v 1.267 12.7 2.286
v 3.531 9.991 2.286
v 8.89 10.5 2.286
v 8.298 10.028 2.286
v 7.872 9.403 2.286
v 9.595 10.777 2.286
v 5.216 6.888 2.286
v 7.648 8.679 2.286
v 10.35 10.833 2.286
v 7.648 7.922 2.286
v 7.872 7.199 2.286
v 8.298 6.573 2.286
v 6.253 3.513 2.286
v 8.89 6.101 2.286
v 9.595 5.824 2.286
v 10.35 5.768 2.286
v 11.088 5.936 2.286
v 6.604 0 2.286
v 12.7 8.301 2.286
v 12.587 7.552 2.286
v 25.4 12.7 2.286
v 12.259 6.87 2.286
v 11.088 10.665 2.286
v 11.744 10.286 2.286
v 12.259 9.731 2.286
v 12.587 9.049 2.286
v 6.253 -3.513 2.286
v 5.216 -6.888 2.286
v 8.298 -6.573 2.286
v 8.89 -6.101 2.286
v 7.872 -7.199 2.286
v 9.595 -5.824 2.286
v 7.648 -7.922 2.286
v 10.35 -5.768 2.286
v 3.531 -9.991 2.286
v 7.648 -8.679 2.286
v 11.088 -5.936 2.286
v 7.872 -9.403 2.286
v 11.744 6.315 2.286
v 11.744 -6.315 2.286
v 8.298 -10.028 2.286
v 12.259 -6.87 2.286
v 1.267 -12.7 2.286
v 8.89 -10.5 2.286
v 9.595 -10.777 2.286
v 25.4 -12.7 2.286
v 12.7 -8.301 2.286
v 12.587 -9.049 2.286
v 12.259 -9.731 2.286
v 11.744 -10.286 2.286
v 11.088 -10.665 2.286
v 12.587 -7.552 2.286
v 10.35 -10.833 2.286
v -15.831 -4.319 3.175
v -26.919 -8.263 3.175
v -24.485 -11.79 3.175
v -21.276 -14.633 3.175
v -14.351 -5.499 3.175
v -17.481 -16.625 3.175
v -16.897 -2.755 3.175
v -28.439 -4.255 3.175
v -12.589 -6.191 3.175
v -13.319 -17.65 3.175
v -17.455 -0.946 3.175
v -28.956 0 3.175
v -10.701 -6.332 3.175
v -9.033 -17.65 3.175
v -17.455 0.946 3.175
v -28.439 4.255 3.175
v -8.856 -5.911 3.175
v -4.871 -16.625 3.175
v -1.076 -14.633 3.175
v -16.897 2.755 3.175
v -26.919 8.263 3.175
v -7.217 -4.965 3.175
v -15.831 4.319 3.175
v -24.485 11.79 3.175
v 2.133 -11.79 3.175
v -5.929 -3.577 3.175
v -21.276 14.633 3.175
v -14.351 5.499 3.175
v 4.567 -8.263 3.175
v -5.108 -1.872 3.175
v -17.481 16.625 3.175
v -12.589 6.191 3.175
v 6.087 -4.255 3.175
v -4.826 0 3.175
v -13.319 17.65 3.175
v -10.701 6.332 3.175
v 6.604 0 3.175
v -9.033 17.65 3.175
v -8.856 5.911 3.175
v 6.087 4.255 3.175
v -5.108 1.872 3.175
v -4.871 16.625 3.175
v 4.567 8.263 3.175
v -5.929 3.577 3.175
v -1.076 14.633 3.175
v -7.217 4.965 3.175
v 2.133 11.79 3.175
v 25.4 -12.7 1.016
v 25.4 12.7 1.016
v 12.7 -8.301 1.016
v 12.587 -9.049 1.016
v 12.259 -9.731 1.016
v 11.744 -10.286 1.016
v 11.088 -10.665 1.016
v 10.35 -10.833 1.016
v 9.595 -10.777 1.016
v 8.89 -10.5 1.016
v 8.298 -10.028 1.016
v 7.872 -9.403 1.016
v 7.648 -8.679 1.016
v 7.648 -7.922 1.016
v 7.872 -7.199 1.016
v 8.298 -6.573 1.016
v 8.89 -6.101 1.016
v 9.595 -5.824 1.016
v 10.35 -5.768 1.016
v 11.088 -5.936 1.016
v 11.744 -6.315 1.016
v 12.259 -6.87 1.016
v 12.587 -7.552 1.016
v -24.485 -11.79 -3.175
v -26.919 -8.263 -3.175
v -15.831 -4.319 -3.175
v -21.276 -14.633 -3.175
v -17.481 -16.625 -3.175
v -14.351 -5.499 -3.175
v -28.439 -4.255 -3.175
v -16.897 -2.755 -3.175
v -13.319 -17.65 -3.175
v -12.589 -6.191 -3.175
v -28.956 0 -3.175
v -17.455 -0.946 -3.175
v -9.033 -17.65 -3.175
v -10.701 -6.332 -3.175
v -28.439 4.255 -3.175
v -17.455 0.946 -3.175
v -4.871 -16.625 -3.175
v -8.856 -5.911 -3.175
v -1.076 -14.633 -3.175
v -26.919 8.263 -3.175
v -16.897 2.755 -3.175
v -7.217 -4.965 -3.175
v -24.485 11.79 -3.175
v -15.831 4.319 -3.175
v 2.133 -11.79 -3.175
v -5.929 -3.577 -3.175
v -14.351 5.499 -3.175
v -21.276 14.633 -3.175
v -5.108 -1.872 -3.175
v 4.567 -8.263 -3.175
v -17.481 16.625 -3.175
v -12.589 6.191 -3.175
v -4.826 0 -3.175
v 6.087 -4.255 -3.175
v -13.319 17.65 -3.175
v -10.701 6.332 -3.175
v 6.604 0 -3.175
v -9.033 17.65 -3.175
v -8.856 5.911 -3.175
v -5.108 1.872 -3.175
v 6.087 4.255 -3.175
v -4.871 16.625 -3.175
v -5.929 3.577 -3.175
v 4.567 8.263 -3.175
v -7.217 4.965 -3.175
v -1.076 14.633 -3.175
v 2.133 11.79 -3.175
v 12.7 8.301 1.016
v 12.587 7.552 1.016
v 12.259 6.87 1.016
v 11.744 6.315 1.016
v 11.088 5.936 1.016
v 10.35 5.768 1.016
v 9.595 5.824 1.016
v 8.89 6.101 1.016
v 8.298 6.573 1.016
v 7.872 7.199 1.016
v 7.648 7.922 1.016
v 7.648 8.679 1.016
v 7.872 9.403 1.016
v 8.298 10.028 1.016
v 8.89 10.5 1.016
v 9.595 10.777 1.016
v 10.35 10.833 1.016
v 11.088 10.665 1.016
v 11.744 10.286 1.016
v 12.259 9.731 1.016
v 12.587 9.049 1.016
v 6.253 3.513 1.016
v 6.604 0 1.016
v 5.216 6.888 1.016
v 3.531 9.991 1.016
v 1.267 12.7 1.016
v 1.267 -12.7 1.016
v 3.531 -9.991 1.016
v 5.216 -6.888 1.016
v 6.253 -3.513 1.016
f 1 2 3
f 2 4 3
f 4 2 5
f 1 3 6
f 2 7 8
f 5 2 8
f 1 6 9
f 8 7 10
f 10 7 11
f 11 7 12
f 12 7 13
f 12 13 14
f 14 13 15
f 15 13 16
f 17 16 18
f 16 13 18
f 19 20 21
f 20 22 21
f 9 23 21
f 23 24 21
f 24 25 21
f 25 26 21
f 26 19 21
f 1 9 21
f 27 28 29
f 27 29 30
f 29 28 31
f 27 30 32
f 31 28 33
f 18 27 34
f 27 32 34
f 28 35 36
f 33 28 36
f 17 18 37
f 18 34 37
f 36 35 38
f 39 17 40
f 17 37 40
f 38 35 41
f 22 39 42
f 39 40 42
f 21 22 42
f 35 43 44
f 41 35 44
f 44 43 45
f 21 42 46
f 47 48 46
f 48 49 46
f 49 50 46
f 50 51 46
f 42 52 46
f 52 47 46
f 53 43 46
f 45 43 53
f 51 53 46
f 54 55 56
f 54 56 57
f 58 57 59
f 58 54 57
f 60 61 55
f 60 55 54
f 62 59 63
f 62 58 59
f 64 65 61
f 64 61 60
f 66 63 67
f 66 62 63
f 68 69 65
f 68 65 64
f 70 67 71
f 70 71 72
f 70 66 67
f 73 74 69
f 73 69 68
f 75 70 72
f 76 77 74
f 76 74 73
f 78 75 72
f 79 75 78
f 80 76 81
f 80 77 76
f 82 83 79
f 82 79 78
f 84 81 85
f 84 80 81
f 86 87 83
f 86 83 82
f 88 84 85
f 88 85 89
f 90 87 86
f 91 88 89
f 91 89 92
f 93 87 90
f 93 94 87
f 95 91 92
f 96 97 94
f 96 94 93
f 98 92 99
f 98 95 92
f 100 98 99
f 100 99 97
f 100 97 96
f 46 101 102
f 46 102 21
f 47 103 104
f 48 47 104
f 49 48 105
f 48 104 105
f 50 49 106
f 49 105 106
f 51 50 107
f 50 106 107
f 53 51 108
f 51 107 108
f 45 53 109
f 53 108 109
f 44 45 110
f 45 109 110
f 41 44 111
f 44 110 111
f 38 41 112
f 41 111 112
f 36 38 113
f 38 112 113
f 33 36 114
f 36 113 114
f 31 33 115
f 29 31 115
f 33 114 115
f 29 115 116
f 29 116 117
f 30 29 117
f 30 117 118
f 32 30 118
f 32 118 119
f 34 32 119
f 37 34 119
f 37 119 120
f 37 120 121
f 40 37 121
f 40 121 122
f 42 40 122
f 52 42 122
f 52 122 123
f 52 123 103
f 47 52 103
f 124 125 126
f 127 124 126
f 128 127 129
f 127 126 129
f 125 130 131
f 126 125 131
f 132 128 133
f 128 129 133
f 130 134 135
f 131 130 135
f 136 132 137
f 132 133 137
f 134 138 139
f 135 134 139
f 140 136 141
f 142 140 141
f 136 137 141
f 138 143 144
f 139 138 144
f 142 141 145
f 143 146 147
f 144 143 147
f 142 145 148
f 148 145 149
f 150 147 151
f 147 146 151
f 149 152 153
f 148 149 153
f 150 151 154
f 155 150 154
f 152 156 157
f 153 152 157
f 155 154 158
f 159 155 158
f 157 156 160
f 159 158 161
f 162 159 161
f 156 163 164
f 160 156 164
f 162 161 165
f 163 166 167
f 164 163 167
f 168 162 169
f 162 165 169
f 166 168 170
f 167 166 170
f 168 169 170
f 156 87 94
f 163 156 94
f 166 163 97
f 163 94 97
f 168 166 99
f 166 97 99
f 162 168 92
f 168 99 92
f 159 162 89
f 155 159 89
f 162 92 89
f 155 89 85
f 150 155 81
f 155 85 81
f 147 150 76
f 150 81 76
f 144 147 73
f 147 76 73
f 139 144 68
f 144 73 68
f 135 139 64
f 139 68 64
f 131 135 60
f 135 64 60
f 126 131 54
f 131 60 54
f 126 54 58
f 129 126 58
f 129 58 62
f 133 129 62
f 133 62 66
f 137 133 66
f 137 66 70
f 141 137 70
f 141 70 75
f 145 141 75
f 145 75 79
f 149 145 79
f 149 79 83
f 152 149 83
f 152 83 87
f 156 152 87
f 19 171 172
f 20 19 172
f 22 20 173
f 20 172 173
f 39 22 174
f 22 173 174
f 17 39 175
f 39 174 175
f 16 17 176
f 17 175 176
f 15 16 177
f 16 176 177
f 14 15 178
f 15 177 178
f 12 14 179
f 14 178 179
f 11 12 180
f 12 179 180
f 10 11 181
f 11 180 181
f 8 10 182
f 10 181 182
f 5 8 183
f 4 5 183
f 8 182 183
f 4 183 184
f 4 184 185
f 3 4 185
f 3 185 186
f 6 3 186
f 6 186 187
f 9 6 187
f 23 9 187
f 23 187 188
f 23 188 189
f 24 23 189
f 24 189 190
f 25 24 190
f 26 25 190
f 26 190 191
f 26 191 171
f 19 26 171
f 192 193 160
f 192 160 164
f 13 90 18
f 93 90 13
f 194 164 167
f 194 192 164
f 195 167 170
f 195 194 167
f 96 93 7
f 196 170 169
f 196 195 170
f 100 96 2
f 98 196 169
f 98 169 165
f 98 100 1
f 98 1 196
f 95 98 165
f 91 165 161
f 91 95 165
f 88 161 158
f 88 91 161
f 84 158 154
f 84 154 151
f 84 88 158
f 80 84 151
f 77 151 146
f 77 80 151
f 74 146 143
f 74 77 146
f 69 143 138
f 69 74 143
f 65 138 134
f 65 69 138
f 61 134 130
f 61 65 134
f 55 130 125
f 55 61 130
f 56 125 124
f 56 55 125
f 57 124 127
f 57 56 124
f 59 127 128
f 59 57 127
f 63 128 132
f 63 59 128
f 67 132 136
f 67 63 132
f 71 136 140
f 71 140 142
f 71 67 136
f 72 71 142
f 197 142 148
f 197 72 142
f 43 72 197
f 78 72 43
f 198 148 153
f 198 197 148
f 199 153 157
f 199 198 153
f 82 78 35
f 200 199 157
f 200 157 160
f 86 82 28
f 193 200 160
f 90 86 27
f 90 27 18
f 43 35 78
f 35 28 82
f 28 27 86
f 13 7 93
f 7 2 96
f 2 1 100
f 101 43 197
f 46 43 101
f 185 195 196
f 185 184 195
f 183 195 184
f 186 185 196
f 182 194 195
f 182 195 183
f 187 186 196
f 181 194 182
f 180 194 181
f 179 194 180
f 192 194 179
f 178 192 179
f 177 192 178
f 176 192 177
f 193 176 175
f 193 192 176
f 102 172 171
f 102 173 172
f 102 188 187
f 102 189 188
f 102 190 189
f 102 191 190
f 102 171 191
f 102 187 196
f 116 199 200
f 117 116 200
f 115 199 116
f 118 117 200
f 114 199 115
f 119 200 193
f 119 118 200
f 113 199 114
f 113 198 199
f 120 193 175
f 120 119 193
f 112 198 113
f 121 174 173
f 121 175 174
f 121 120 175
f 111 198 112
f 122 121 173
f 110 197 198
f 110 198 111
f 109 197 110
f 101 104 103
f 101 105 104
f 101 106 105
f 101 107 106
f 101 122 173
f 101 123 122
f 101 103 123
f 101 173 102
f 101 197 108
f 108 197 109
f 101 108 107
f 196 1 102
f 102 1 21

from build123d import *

# Parameters (mm, degrees)
F0_W     = 25.4
F0_H     = 1.27
F1_DEPTH = 12.7
F2_R     = 2.54
F3_DEPTH = 1.271
F4_R     = 17.78
F5_DEPTH = 3.175
F6_R     = 6.35
F7_DEPTH = 6.351


with BuildPart() as f1:
    # F0 (on Front) → F1 (new body, symmetric)
    with BuildSketch(Plane.XZ):
        with Locations((12.7, 1.651)):
            Rectangle(F0_W, F0_H)
    extrude(amount=F1_DEPTH, both=True)

    # F2 (on face) → F3 (cut, through all)
    with BuildSketch(Plane(origin=(0, 0, 1.016), x_dir=(1, 0, 0), z_dir=(0, 0, -1))):
        with Locations((10.16, 8.300591)):
            Circle(F2_R)
        with Locations((10.16, -8.300591)):
            Circle(F2_R)
    extrude(amount=-F3_DEPTH, mode=Mode.SUBTRACT)

    # F4 (on Top) → F5 (join, symmetric)
    with BuildSketch(Plane.XY):
        with Locations((-11.176, 0)):
            Circle(F4_R)
    extrude(amount=F5_DEPTH, both=True)

    # F6 (on face) → F7 (cut, through all)
    with BuildSketch(Plane.XY.offset(3.175)):
        with Locations((-11.176, 0)):
            Circle(F6_R)
    extrude(amount=-F7_DEPTH, mode=Mode.SUBTRACT)


solid = f1.part
